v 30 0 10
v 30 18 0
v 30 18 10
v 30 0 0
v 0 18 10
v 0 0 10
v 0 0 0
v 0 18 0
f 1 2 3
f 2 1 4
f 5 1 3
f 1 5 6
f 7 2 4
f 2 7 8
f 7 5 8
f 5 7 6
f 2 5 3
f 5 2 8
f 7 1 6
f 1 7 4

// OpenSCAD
$fn = 50;difference() {
	union() {
		cube(size = [30, 18, 10]);
	}
	union();
}
